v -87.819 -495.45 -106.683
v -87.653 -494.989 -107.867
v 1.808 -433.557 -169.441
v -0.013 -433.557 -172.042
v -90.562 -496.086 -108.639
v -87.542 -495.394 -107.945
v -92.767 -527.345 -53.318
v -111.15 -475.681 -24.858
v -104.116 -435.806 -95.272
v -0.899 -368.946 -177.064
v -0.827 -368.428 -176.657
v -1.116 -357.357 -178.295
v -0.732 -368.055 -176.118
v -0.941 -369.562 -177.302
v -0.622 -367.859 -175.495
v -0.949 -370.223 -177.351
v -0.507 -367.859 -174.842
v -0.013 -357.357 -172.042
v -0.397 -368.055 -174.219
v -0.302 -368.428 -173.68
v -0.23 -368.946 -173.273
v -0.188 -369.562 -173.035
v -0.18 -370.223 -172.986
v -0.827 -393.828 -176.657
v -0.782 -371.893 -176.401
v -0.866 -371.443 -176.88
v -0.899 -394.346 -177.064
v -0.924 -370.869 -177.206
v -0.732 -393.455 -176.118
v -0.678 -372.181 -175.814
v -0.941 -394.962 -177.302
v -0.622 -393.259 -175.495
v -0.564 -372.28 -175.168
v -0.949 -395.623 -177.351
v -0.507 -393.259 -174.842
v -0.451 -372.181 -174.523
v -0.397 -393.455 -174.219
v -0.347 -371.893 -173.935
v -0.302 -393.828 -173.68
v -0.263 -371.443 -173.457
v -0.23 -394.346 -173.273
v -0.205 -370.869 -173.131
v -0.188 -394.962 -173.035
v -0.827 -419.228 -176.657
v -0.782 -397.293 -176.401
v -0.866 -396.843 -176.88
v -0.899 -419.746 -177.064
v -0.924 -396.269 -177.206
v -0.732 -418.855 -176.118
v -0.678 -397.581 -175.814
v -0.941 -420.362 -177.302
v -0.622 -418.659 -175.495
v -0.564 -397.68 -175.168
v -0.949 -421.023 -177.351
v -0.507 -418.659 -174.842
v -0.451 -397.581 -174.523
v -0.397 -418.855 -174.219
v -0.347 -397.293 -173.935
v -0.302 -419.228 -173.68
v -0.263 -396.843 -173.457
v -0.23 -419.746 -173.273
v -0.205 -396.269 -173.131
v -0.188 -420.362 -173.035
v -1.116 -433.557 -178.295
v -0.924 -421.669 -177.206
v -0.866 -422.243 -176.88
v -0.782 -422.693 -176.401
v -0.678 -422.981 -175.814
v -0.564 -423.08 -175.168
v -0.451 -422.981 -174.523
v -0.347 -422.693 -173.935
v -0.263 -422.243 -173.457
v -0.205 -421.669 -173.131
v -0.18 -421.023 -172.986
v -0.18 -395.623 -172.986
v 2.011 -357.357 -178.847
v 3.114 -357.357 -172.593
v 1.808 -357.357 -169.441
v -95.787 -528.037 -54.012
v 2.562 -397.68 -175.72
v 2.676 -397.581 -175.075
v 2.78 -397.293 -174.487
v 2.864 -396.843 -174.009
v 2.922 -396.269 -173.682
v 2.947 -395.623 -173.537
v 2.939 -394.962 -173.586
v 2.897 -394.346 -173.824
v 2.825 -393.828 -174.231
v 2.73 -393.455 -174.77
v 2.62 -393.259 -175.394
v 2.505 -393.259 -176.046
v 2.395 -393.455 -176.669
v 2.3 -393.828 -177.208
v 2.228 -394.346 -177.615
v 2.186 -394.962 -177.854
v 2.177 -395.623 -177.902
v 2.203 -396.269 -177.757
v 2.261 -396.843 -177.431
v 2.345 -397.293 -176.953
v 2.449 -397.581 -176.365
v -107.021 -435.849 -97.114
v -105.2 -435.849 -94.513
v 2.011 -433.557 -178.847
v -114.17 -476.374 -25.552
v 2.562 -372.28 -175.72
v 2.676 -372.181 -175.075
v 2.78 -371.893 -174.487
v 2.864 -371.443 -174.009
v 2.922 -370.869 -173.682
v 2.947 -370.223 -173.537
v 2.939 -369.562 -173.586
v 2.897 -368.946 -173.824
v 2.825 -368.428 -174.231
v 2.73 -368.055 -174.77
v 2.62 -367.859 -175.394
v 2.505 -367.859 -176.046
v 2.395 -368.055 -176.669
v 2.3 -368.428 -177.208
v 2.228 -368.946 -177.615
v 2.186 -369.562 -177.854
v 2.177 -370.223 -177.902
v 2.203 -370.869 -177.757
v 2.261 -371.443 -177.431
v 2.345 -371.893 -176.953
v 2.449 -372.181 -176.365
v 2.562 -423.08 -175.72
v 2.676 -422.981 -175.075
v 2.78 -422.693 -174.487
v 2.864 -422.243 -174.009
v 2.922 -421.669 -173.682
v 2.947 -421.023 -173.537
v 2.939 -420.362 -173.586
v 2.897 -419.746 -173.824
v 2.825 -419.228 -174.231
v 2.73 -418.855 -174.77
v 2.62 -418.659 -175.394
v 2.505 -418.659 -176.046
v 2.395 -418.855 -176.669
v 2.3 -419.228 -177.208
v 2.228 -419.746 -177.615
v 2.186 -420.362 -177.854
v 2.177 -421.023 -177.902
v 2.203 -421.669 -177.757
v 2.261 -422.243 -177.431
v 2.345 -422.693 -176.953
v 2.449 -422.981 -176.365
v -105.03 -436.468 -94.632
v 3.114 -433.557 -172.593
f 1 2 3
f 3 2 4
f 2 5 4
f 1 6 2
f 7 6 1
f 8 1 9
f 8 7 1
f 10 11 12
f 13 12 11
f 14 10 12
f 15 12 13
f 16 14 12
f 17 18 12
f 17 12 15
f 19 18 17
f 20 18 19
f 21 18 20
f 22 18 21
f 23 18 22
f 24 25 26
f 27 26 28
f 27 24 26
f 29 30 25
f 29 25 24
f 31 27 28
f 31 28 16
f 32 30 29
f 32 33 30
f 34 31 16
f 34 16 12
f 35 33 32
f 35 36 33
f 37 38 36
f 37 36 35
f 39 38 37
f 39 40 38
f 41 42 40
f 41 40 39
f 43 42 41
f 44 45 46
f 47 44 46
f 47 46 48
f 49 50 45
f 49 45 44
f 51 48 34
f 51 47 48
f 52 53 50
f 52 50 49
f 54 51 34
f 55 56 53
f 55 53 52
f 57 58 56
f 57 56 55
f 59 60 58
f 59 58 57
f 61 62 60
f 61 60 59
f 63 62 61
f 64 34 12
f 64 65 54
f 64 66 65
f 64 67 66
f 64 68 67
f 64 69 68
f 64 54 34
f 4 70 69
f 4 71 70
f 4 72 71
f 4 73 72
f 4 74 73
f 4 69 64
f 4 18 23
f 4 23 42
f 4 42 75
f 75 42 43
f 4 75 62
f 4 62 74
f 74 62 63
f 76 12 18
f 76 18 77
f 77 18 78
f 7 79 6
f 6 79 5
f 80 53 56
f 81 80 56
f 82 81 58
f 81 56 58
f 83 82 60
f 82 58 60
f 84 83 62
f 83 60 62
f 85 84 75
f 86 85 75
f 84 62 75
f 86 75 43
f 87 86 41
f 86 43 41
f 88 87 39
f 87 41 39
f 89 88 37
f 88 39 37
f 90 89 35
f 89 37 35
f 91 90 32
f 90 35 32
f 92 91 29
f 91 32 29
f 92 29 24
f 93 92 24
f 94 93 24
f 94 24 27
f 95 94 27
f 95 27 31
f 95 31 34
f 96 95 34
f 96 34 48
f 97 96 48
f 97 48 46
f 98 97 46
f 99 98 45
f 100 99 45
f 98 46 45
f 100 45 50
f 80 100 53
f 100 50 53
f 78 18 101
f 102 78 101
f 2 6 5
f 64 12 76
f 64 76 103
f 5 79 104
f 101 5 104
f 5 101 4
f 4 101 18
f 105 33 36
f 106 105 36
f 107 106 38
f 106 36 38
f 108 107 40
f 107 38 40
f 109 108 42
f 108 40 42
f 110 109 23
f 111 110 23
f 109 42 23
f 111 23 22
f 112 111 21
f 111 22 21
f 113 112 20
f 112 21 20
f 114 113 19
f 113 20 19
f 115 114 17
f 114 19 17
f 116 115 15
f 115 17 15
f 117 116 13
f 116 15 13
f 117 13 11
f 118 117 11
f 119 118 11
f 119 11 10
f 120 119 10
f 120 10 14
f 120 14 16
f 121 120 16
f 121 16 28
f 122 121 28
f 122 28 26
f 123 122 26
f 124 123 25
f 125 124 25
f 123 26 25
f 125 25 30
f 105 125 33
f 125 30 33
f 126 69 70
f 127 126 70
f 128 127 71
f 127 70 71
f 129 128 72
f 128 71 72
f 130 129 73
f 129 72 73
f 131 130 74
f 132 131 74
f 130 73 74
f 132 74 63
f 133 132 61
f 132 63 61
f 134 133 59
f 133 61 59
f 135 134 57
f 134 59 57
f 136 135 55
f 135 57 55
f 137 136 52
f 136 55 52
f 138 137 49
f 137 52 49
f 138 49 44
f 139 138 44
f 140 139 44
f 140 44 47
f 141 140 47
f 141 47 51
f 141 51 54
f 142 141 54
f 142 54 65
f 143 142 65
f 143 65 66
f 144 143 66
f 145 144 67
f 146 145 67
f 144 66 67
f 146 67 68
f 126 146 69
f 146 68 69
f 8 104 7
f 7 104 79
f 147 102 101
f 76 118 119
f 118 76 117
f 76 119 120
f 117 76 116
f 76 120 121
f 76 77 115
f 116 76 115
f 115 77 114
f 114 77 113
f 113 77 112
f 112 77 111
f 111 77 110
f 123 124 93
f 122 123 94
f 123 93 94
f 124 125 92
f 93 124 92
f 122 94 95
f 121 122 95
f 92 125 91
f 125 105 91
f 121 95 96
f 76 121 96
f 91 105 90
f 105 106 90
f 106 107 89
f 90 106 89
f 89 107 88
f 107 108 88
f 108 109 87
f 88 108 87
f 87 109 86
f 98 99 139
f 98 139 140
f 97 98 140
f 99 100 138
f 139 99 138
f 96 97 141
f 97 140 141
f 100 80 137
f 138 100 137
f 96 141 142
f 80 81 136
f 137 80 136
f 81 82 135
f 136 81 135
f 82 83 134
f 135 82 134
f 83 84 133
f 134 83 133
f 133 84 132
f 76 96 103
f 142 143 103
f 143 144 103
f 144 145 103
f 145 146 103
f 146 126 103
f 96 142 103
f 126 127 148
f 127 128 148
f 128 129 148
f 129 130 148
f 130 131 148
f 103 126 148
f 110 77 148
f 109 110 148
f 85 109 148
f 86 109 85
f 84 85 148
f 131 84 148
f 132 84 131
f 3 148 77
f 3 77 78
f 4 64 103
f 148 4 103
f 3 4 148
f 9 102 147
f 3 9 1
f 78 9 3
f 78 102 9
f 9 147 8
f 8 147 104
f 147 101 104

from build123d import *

# Parameters (mm, degrees)
F2_W      = 76.2
F2_H      = 6.35
F2_R      = 2.2225
F3_DEPTH  = 3.175
F6_DEPTH  = 76.2
F8_DEPTH  = 3.175
F11_DEPTH = 3.175


with BuildPart() as f3:
    # F2 (on face) → F3 (new body)
    with BuildSketch(Plane(origin=(29.4081501121, 0, -5.1854503175), x_dir=(0, -1, 0), z_dir=(-0.984807753, 0, 0.1736481777))):
        with Locations((395.4570037365, -172.6052516222)):
            Rectangle(F2_W, F2_H)
        with Locations((370.0570037365, -172.6052516222)):
            Circle(F2_R, mode=Mode.SUBTRACT)
        with Locations((395.4570037365, -172.6052516222)):
            Circle(F2_R, mode=Mode.SUBTRACT)
        with Locations((420.8570037365, -172.6052516222)):
            Circle(F2_R, mode=Mode.SUBTRACT)
    extrude(amount=-F3_DEPTH)

    # F5 (on face) → F6 (join)
    with BuildSketch(Plane.XZ.offset(433.5570037365)):
        Polygon((1.8080008617, -169.4408679692), (-0.0131043237, -172.0416757098), (3.1136602921, -172.5930086739), align=None)
    extrude(amount=-F6_DEPTH)

    # F7 (on face) → F8 (join)
    with BuildSketch(Plane(origin=(-80.8374577566, 0, -115.4478541652), x_dir=(0.8191520443, 0, -0.5735764364), z_dir=(0.5735764364, 0, 0.8191520443))):
        Polygon((98.668316824, -433.5570037365), (98.668316824, -357.3570037365), (-31.963979803, -435.8488063528), (-11.8716898834, -496.0862522298), align=None)
    extrude(amount=F8_DEPTH)

    # F10 (on face) → F11 (join)
    with BuildSketch(Plane(origin=(-207.4110943856, -47.5543564592, -47.6509479128), x_dir=(-0.2125394907, 0.9759316977, -0.0488291537), z_dir=(0.9511529667, 0.2180764118, 0.2185193642))):
        Polygon((-492.3325427071, -31.1929582626), (-459.5935318176, -85.6025820986), (-397.8705177815, -70.6854932975), (-439.3948891587, 0.6603480791), align=None)
    extrude(amount=F11_DEPTH)


solid = f3.part
